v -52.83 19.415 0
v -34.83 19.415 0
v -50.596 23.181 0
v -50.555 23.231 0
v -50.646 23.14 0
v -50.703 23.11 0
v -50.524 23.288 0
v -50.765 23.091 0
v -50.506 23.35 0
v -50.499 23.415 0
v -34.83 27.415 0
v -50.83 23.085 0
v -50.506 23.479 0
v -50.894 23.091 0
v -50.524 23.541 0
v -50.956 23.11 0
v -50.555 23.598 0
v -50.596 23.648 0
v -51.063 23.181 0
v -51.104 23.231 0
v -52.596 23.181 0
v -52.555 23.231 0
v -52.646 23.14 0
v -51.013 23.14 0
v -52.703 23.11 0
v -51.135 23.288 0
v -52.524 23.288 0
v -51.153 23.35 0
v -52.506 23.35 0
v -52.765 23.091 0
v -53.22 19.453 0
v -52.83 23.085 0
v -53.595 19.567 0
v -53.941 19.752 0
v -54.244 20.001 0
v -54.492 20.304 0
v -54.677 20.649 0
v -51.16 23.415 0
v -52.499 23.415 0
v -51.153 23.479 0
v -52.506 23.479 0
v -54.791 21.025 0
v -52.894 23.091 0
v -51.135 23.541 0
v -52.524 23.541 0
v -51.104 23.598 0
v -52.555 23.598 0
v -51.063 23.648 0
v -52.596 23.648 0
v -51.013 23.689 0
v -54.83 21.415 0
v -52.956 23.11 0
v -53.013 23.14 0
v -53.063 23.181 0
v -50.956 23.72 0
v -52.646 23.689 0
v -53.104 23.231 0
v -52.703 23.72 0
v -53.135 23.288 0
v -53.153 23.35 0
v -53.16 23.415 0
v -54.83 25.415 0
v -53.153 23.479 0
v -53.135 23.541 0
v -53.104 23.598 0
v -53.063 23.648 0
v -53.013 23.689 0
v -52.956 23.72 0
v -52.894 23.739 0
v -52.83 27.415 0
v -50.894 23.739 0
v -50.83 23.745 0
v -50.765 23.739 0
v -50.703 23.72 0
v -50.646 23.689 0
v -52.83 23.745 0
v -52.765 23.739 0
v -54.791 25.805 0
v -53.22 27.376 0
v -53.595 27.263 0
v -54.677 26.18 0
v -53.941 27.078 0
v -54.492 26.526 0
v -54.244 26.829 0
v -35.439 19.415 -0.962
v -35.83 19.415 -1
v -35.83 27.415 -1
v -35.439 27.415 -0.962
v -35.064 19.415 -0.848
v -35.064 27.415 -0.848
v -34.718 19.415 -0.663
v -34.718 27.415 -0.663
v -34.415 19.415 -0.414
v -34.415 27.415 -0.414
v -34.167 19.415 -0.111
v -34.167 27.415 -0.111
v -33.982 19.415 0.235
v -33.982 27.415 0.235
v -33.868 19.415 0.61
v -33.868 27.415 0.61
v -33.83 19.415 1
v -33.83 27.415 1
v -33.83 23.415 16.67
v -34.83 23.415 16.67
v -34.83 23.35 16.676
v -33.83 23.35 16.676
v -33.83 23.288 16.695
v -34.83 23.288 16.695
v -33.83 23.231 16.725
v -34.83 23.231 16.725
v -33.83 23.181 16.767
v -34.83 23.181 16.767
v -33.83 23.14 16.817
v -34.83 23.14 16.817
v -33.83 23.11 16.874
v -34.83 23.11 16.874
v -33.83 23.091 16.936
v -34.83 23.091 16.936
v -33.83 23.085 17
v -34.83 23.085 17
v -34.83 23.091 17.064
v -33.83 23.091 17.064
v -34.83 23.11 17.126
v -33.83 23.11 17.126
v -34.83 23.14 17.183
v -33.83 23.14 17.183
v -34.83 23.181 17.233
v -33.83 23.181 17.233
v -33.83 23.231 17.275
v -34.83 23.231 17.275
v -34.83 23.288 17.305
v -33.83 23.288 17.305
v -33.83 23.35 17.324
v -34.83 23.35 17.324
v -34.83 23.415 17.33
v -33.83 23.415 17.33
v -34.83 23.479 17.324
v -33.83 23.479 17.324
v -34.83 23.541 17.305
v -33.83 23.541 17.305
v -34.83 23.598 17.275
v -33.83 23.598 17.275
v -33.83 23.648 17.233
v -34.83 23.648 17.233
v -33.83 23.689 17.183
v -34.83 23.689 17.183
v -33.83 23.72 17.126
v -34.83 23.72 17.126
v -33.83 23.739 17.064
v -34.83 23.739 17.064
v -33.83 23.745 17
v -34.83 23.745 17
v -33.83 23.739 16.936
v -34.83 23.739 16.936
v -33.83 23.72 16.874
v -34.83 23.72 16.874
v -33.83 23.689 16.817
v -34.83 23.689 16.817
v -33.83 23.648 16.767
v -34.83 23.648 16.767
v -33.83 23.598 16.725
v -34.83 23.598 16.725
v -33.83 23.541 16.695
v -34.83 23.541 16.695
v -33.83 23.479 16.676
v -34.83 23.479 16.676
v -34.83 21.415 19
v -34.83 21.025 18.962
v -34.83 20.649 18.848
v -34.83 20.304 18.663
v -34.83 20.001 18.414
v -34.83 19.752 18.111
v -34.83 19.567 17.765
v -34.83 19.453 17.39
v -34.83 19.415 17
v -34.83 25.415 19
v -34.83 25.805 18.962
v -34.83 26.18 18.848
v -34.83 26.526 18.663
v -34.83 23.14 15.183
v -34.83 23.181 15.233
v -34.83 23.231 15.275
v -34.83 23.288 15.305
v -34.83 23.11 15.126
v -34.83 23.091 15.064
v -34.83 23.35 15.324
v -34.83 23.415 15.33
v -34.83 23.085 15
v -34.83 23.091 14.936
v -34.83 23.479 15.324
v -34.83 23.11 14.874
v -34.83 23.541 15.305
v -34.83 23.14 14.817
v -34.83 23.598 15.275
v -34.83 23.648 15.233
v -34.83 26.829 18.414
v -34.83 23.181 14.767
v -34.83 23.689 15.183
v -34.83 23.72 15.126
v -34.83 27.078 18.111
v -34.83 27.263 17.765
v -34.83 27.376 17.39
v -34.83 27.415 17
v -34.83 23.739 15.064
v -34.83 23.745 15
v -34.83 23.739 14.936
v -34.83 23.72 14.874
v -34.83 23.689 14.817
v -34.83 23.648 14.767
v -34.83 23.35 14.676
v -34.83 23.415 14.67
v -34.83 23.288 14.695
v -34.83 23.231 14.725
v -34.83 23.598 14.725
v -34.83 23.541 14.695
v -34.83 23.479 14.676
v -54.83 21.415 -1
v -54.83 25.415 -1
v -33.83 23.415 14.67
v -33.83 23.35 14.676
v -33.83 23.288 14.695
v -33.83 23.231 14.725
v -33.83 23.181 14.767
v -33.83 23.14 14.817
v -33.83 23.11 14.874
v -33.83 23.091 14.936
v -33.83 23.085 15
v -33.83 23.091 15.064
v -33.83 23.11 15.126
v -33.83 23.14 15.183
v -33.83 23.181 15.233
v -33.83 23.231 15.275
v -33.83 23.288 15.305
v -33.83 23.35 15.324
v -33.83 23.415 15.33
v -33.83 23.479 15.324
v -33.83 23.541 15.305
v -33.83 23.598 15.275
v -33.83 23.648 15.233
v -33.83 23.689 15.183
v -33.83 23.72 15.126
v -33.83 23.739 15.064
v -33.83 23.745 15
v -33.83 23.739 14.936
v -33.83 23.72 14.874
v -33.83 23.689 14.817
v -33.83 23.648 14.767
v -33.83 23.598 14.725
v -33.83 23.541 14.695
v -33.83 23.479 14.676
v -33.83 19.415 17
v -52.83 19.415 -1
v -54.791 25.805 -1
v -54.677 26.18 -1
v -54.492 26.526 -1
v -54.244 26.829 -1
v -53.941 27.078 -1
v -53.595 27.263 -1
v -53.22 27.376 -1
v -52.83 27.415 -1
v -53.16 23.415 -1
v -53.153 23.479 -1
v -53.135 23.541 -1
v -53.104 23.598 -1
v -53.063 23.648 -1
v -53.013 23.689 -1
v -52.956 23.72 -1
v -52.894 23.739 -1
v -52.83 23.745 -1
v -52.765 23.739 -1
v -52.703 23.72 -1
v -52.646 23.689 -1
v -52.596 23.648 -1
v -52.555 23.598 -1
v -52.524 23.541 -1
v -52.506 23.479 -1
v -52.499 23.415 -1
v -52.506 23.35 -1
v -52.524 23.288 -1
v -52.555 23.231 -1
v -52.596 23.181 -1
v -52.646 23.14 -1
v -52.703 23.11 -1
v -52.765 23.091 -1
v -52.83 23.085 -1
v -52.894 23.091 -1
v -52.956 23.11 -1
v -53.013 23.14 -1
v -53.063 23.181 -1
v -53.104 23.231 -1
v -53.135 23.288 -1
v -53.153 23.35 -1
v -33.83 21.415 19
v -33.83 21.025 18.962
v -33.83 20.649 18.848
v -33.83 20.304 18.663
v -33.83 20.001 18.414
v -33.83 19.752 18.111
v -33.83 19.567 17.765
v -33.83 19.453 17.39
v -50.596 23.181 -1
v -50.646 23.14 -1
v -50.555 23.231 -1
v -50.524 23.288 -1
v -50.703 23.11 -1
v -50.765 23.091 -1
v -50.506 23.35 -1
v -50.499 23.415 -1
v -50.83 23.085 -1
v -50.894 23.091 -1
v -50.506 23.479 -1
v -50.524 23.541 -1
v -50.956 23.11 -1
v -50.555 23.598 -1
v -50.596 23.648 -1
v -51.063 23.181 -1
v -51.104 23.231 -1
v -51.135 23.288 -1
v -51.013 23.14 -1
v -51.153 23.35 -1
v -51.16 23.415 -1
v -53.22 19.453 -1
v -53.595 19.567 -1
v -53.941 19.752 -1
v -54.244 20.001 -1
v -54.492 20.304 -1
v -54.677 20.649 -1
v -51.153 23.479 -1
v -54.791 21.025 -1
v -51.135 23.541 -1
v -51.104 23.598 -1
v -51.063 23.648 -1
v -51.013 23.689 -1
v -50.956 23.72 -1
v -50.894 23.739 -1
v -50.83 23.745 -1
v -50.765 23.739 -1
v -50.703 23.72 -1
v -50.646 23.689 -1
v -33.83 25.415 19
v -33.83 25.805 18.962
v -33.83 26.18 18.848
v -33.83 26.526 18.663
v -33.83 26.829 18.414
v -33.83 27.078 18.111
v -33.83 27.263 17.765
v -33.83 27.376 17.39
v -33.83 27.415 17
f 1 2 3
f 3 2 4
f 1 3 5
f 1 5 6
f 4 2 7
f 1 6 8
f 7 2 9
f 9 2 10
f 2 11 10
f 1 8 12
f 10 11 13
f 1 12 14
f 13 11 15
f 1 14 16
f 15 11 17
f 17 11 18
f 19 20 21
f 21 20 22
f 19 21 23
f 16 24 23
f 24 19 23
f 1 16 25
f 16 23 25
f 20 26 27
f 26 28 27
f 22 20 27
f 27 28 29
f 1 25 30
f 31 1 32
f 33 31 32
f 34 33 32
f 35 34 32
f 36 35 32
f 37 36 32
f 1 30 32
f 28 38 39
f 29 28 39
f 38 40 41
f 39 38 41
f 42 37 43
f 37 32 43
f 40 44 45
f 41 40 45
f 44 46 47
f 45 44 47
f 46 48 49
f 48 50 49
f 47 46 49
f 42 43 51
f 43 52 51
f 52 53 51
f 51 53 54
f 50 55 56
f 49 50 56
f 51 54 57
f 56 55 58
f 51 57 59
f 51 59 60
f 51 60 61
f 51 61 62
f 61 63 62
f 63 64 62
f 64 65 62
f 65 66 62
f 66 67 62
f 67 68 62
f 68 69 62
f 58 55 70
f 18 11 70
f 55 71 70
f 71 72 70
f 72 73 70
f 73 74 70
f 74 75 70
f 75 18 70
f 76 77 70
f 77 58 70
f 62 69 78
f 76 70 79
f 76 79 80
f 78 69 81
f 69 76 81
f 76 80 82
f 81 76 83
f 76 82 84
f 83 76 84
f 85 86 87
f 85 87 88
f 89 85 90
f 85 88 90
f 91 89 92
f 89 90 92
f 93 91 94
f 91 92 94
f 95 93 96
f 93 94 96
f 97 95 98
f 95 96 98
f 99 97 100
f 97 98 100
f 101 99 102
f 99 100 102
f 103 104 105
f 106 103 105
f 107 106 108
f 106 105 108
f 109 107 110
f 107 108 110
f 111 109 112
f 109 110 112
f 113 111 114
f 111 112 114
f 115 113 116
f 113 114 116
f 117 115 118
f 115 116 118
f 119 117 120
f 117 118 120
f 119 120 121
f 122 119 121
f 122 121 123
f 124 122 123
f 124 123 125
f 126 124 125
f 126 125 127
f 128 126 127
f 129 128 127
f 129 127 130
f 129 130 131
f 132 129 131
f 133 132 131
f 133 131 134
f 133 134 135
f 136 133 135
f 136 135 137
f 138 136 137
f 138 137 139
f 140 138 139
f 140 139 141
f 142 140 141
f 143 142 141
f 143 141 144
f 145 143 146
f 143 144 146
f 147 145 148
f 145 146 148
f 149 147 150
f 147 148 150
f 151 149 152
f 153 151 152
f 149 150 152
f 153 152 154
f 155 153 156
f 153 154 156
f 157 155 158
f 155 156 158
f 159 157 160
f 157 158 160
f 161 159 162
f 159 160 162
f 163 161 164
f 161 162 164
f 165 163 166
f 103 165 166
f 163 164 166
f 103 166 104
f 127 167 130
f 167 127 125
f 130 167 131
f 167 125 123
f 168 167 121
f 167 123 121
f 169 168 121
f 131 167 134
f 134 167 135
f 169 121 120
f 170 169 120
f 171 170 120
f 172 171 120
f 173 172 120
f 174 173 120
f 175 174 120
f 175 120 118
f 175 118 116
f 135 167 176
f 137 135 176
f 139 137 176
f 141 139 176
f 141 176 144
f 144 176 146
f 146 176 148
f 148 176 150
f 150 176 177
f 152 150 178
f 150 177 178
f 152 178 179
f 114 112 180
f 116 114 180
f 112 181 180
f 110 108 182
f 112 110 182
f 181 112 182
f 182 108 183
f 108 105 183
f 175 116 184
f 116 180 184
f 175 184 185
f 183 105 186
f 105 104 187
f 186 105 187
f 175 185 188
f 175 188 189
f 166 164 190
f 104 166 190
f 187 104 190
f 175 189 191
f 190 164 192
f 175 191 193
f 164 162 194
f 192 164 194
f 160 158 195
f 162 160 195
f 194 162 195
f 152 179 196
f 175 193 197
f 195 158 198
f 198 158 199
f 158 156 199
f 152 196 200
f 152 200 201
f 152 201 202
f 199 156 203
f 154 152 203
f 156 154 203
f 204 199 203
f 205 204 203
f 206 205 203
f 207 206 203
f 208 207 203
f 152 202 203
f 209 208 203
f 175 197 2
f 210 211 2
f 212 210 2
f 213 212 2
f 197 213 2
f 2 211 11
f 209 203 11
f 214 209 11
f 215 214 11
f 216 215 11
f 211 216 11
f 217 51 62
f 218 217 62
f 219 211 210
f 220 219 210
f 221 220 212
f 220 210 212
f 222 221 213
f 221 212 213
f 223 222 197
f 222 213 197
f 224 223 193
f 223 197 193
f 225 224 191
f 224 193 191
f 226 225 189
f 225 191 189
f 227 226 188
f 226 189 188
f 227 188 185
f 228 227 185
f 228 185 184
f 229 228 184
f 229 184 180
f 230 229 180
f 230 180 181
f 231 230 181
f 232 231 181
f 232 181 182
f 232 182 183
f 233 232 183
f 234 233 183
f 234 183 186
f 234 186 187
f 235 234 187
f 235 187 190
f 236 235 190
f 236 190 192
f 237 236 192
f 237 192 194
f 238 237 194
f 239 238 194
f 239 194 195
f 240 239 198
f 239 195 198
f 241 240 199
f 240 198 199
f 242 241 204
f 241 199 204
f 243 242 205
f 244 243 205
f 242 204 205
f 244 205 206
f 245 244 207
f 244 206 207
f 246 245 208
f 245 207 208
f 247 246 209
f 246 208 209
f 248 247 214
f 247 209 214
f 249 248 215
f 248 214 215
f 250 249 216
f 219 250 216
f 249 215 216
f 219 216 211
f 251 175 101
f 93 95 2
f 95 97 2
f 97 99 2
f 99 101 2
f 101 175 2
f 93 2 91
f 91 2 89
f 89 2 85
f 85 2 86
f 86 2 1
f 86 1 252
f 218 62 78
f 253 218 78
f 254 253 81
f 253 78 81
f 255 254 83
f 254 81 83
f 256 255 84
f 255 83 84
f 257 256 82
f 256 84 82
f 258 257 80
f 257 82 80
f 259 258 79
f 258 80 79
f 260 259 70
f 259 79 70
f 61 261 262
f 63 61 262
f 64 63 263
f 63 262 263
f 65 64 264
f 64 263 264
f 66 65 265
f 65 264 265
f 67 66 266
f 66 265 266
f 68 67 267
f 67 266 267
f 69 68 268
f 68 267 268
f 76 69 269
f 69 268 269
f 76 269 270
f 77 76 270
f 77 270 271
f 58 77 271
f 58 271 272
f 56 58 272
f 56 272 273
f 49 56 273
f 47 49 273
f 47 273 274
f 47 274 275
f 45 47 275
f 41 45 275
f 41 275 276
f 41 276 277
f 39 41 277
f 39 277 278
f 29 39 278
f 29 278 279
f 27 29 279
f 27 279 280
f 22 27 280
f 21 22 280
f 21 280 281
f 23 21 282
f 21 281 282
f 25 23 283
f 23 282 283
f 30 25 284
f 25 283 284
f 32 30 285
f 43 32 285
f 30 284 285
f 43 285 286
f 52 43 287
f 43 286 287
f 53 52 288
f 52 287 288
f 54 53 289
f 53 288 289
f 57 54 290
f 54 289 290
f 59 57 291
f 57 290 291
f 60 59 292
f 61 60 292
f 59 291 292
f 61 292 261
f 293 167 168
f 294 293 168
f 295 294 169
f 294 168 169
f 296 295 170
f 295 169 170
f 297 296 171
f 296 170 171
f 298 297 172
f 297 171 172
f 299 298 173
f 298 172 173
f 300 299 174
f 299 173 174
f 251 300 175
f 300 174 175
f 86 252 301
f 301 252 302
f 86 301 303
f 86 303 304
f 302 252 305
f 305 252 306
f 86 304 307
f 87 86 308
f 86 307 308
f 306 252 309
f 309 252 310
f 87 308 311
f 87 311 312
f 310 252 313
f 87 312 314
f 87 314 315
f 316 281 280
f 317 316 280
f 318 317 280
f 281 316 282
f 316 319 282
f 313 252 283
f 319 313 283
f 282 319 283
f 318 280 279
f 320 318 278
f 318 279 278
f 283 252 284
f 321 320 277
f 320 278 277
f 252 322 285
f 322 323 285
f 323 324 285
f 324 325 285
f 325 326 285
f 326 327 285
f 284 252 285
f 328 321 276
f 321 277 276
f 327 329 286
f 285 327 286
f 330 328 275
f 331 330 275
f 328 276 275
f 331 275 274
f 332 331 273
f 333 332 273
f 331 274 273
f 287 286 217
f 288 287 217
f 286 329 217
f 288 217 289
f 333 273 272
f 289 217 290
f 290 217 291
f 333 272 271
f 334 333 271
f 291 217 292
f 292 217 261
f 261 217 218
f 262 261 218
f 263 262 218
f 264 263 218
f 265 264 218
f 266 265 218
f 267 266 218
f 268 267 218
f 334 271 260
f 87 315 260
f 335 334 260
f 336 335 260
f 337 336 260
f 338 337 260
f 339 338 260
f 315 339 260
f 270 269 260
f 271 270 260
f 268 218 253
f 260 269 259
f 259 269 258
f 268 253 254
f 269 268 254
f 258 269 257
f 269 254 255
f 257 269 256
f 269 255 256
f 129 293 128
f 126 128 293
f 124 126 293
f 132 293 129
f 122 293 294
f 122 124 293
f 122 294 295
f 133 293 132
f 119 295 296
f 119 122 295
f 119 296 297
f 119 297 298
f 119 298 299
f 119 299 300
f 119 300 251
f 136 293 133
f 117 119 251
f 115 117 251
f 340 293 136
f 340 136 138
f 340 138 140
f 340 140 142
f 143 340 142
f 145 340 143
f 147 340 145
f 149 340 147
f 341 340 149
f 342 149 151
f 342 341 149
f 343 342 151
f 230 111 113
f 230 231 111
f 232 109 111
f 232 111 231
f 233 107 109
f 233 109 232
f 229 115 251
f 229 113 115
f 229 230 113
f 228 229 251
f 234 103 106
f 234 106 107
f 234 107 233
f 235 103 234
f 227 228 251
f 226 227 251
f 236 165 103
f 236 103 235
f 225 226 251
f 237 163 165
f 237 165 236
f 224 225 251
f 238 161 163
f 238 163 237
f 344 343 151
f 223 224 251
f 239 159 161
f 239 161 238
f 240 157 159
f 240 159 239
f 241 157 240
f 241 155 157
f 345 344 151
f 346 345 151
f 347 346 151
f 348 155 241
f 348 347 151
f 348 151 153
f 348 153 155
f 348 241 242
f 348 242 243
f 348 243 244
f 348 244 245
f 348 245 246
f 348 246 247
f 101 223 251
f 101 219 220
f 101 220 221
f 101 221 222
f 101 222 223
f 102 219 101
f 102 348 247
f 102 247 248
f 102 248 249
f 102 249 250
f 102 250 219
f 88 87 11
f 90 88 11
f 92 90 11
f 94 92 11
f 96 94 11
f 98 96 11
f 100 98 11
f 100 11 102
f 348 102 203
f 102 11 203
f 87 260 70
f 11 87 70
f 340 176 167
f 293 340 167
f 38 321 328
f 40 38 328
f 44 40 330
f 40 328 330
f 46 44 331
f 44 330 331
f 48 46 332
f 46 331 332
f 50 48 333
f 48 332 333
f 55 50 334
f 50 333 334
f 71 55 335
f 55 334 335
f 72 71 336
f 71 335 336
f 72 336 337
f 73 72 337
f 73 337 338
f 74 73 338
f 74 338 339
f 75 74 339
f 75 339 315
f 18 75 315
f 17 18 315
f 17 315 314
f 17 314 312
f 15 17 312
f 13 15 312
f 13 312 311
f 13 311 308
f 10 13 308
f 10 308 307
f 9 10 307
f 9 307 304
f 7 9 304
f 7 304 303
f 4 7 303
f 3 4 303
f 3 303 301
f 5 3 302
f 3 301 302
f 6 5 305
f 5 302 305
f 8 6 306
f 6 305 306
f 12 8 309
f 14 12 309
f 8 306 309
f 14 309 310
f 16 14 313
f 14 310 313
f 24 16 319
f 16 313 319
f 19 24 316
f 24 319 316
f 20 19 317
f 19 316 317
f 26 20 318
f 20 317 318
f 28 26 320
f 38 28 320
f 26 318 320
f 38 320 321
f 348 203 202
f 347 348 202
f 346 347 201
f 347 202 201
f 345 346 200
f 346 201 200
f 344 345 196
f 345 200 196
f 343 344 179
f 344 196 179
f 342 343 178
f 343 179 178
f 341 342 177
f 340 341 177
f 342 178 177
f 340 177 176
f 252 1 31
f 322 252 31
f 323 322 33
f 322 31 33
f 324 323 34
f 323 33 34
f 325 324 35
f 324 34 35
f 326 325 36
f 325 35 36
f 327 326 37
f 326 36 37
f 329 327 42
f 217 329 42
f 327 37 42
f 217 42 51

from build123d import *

# Parameters (mm, degrees)
EXTRUSION1_DEPTH   = 1
EXTRUSION3_DEPTH   = 1
D_GAGEMENT_00001_D = 0.6604
D_GAGEMENT_00002_D = 0.6604
D_GAGEMENT_00004_D = 0.6604
D_GAGEMENT_00005_D = 0.6604
CONG_2_R           = 2


with BuildPart() as part:
    # Esquisse1 → Extrusion1 (new body)
    with BuildSketch(Plane.XY):
        with BuildLine():
            Line((-52.829500905, 27.414750453), (-34.829500905, 27.414750453))
            Line((-34.829500905, 27.414750453), (-34.829500905, 19.414750453))
            Line((-34.829500905, 19.414750453), (-52.829500905, 19.414750453))
            ThreePointArc((-52.829500905, 19.414750453), (-54.243714467, 20.00053689), (-54.829500905, 21.414750453))
            Line((-54.829500905, 21.414750453), (-54.829500905, 25.414750453))
            ThreePointArc((-54.829500905, 25.414750453), (-54.243714467, 26.828964015), (-52.829500905, 27.414750453))
        make_face()
    extrude(amount=-EXTRUSION1_DEPTH)

    # Esquisse4 → Extrusion3 (add)
    with BuildSketch(Plane(origin=(-34.829500905, 0, 0), x_dir=(0, 0, -1), z_dir=(1, 0, 0))):
        with BuildLine():
            Line((1, 27.414750453), (-17, 27.414750453))
            ThreePointArc((-17, 27.414750453), (-18.414213562, 26.828964015), (-19, 25.414750453))
            Line((-19, 25.414750453), (-19, 21.414750453))
            ThreePointArc((-19, 21.414750453), (-18.414213562, 20.00053689), (-17, 19.414750453))
            Line((-17, 19.414750453), (1, 19.414750453))
            Line((1, 19.414750453), (1, 27.414750453))
        make_face()
    extrude(amount=EXTRUSION3_DEPTH)

    # Dégagement #00001 (through all)
    with Locations(Plane(origin=(-52.829500905, 23.414750453, 0), x_dir=(1, 0, 0), z_dir=(0, 0, 1))):
        with Locations((0, 0)):
            Hole(D_GAGEMENT_00001_D / 2)

    # Dégagement #00002 (through all)
    with Locations(Plane(origin=(-50.829500905, 23.414750453, 0), x_dir=(1, 0, 0), z_dir=(0, 0, 1))):
        with Locations((0, 0)):
            Hole(D_GAGEMENT_00002_D / 2)

    # Dégagement #00004 (through all)
    with Locations(Plane(origin=(-33.829500905, 23.414750453, 17), x_dir=(0, 0, 1), z_dir=(1, 0, 0))):
        with Locations((0, 0)):
            Hole(D_GAGEMENT_00004_D / 2)

    # Dégagement #00005 (through all)
    with Locations(Plane(origin=(-33.829500905, 23.414750453, 15), x_dir=(0, 0, 1), z_dir=(1, 0, 0))):
        with Locations((0, 0)):
            Hole(D_GAGEMENT_00005_D / 2)

    # Congé2
    cong_2_edges = [part.edges().sort_by_distance(p)[0] for p in [
        (-33.829500905, 23.414750453, -1),
    ]]
    fillet(cong_2_edges, radius=CONG_2_R)


solid = part.part
